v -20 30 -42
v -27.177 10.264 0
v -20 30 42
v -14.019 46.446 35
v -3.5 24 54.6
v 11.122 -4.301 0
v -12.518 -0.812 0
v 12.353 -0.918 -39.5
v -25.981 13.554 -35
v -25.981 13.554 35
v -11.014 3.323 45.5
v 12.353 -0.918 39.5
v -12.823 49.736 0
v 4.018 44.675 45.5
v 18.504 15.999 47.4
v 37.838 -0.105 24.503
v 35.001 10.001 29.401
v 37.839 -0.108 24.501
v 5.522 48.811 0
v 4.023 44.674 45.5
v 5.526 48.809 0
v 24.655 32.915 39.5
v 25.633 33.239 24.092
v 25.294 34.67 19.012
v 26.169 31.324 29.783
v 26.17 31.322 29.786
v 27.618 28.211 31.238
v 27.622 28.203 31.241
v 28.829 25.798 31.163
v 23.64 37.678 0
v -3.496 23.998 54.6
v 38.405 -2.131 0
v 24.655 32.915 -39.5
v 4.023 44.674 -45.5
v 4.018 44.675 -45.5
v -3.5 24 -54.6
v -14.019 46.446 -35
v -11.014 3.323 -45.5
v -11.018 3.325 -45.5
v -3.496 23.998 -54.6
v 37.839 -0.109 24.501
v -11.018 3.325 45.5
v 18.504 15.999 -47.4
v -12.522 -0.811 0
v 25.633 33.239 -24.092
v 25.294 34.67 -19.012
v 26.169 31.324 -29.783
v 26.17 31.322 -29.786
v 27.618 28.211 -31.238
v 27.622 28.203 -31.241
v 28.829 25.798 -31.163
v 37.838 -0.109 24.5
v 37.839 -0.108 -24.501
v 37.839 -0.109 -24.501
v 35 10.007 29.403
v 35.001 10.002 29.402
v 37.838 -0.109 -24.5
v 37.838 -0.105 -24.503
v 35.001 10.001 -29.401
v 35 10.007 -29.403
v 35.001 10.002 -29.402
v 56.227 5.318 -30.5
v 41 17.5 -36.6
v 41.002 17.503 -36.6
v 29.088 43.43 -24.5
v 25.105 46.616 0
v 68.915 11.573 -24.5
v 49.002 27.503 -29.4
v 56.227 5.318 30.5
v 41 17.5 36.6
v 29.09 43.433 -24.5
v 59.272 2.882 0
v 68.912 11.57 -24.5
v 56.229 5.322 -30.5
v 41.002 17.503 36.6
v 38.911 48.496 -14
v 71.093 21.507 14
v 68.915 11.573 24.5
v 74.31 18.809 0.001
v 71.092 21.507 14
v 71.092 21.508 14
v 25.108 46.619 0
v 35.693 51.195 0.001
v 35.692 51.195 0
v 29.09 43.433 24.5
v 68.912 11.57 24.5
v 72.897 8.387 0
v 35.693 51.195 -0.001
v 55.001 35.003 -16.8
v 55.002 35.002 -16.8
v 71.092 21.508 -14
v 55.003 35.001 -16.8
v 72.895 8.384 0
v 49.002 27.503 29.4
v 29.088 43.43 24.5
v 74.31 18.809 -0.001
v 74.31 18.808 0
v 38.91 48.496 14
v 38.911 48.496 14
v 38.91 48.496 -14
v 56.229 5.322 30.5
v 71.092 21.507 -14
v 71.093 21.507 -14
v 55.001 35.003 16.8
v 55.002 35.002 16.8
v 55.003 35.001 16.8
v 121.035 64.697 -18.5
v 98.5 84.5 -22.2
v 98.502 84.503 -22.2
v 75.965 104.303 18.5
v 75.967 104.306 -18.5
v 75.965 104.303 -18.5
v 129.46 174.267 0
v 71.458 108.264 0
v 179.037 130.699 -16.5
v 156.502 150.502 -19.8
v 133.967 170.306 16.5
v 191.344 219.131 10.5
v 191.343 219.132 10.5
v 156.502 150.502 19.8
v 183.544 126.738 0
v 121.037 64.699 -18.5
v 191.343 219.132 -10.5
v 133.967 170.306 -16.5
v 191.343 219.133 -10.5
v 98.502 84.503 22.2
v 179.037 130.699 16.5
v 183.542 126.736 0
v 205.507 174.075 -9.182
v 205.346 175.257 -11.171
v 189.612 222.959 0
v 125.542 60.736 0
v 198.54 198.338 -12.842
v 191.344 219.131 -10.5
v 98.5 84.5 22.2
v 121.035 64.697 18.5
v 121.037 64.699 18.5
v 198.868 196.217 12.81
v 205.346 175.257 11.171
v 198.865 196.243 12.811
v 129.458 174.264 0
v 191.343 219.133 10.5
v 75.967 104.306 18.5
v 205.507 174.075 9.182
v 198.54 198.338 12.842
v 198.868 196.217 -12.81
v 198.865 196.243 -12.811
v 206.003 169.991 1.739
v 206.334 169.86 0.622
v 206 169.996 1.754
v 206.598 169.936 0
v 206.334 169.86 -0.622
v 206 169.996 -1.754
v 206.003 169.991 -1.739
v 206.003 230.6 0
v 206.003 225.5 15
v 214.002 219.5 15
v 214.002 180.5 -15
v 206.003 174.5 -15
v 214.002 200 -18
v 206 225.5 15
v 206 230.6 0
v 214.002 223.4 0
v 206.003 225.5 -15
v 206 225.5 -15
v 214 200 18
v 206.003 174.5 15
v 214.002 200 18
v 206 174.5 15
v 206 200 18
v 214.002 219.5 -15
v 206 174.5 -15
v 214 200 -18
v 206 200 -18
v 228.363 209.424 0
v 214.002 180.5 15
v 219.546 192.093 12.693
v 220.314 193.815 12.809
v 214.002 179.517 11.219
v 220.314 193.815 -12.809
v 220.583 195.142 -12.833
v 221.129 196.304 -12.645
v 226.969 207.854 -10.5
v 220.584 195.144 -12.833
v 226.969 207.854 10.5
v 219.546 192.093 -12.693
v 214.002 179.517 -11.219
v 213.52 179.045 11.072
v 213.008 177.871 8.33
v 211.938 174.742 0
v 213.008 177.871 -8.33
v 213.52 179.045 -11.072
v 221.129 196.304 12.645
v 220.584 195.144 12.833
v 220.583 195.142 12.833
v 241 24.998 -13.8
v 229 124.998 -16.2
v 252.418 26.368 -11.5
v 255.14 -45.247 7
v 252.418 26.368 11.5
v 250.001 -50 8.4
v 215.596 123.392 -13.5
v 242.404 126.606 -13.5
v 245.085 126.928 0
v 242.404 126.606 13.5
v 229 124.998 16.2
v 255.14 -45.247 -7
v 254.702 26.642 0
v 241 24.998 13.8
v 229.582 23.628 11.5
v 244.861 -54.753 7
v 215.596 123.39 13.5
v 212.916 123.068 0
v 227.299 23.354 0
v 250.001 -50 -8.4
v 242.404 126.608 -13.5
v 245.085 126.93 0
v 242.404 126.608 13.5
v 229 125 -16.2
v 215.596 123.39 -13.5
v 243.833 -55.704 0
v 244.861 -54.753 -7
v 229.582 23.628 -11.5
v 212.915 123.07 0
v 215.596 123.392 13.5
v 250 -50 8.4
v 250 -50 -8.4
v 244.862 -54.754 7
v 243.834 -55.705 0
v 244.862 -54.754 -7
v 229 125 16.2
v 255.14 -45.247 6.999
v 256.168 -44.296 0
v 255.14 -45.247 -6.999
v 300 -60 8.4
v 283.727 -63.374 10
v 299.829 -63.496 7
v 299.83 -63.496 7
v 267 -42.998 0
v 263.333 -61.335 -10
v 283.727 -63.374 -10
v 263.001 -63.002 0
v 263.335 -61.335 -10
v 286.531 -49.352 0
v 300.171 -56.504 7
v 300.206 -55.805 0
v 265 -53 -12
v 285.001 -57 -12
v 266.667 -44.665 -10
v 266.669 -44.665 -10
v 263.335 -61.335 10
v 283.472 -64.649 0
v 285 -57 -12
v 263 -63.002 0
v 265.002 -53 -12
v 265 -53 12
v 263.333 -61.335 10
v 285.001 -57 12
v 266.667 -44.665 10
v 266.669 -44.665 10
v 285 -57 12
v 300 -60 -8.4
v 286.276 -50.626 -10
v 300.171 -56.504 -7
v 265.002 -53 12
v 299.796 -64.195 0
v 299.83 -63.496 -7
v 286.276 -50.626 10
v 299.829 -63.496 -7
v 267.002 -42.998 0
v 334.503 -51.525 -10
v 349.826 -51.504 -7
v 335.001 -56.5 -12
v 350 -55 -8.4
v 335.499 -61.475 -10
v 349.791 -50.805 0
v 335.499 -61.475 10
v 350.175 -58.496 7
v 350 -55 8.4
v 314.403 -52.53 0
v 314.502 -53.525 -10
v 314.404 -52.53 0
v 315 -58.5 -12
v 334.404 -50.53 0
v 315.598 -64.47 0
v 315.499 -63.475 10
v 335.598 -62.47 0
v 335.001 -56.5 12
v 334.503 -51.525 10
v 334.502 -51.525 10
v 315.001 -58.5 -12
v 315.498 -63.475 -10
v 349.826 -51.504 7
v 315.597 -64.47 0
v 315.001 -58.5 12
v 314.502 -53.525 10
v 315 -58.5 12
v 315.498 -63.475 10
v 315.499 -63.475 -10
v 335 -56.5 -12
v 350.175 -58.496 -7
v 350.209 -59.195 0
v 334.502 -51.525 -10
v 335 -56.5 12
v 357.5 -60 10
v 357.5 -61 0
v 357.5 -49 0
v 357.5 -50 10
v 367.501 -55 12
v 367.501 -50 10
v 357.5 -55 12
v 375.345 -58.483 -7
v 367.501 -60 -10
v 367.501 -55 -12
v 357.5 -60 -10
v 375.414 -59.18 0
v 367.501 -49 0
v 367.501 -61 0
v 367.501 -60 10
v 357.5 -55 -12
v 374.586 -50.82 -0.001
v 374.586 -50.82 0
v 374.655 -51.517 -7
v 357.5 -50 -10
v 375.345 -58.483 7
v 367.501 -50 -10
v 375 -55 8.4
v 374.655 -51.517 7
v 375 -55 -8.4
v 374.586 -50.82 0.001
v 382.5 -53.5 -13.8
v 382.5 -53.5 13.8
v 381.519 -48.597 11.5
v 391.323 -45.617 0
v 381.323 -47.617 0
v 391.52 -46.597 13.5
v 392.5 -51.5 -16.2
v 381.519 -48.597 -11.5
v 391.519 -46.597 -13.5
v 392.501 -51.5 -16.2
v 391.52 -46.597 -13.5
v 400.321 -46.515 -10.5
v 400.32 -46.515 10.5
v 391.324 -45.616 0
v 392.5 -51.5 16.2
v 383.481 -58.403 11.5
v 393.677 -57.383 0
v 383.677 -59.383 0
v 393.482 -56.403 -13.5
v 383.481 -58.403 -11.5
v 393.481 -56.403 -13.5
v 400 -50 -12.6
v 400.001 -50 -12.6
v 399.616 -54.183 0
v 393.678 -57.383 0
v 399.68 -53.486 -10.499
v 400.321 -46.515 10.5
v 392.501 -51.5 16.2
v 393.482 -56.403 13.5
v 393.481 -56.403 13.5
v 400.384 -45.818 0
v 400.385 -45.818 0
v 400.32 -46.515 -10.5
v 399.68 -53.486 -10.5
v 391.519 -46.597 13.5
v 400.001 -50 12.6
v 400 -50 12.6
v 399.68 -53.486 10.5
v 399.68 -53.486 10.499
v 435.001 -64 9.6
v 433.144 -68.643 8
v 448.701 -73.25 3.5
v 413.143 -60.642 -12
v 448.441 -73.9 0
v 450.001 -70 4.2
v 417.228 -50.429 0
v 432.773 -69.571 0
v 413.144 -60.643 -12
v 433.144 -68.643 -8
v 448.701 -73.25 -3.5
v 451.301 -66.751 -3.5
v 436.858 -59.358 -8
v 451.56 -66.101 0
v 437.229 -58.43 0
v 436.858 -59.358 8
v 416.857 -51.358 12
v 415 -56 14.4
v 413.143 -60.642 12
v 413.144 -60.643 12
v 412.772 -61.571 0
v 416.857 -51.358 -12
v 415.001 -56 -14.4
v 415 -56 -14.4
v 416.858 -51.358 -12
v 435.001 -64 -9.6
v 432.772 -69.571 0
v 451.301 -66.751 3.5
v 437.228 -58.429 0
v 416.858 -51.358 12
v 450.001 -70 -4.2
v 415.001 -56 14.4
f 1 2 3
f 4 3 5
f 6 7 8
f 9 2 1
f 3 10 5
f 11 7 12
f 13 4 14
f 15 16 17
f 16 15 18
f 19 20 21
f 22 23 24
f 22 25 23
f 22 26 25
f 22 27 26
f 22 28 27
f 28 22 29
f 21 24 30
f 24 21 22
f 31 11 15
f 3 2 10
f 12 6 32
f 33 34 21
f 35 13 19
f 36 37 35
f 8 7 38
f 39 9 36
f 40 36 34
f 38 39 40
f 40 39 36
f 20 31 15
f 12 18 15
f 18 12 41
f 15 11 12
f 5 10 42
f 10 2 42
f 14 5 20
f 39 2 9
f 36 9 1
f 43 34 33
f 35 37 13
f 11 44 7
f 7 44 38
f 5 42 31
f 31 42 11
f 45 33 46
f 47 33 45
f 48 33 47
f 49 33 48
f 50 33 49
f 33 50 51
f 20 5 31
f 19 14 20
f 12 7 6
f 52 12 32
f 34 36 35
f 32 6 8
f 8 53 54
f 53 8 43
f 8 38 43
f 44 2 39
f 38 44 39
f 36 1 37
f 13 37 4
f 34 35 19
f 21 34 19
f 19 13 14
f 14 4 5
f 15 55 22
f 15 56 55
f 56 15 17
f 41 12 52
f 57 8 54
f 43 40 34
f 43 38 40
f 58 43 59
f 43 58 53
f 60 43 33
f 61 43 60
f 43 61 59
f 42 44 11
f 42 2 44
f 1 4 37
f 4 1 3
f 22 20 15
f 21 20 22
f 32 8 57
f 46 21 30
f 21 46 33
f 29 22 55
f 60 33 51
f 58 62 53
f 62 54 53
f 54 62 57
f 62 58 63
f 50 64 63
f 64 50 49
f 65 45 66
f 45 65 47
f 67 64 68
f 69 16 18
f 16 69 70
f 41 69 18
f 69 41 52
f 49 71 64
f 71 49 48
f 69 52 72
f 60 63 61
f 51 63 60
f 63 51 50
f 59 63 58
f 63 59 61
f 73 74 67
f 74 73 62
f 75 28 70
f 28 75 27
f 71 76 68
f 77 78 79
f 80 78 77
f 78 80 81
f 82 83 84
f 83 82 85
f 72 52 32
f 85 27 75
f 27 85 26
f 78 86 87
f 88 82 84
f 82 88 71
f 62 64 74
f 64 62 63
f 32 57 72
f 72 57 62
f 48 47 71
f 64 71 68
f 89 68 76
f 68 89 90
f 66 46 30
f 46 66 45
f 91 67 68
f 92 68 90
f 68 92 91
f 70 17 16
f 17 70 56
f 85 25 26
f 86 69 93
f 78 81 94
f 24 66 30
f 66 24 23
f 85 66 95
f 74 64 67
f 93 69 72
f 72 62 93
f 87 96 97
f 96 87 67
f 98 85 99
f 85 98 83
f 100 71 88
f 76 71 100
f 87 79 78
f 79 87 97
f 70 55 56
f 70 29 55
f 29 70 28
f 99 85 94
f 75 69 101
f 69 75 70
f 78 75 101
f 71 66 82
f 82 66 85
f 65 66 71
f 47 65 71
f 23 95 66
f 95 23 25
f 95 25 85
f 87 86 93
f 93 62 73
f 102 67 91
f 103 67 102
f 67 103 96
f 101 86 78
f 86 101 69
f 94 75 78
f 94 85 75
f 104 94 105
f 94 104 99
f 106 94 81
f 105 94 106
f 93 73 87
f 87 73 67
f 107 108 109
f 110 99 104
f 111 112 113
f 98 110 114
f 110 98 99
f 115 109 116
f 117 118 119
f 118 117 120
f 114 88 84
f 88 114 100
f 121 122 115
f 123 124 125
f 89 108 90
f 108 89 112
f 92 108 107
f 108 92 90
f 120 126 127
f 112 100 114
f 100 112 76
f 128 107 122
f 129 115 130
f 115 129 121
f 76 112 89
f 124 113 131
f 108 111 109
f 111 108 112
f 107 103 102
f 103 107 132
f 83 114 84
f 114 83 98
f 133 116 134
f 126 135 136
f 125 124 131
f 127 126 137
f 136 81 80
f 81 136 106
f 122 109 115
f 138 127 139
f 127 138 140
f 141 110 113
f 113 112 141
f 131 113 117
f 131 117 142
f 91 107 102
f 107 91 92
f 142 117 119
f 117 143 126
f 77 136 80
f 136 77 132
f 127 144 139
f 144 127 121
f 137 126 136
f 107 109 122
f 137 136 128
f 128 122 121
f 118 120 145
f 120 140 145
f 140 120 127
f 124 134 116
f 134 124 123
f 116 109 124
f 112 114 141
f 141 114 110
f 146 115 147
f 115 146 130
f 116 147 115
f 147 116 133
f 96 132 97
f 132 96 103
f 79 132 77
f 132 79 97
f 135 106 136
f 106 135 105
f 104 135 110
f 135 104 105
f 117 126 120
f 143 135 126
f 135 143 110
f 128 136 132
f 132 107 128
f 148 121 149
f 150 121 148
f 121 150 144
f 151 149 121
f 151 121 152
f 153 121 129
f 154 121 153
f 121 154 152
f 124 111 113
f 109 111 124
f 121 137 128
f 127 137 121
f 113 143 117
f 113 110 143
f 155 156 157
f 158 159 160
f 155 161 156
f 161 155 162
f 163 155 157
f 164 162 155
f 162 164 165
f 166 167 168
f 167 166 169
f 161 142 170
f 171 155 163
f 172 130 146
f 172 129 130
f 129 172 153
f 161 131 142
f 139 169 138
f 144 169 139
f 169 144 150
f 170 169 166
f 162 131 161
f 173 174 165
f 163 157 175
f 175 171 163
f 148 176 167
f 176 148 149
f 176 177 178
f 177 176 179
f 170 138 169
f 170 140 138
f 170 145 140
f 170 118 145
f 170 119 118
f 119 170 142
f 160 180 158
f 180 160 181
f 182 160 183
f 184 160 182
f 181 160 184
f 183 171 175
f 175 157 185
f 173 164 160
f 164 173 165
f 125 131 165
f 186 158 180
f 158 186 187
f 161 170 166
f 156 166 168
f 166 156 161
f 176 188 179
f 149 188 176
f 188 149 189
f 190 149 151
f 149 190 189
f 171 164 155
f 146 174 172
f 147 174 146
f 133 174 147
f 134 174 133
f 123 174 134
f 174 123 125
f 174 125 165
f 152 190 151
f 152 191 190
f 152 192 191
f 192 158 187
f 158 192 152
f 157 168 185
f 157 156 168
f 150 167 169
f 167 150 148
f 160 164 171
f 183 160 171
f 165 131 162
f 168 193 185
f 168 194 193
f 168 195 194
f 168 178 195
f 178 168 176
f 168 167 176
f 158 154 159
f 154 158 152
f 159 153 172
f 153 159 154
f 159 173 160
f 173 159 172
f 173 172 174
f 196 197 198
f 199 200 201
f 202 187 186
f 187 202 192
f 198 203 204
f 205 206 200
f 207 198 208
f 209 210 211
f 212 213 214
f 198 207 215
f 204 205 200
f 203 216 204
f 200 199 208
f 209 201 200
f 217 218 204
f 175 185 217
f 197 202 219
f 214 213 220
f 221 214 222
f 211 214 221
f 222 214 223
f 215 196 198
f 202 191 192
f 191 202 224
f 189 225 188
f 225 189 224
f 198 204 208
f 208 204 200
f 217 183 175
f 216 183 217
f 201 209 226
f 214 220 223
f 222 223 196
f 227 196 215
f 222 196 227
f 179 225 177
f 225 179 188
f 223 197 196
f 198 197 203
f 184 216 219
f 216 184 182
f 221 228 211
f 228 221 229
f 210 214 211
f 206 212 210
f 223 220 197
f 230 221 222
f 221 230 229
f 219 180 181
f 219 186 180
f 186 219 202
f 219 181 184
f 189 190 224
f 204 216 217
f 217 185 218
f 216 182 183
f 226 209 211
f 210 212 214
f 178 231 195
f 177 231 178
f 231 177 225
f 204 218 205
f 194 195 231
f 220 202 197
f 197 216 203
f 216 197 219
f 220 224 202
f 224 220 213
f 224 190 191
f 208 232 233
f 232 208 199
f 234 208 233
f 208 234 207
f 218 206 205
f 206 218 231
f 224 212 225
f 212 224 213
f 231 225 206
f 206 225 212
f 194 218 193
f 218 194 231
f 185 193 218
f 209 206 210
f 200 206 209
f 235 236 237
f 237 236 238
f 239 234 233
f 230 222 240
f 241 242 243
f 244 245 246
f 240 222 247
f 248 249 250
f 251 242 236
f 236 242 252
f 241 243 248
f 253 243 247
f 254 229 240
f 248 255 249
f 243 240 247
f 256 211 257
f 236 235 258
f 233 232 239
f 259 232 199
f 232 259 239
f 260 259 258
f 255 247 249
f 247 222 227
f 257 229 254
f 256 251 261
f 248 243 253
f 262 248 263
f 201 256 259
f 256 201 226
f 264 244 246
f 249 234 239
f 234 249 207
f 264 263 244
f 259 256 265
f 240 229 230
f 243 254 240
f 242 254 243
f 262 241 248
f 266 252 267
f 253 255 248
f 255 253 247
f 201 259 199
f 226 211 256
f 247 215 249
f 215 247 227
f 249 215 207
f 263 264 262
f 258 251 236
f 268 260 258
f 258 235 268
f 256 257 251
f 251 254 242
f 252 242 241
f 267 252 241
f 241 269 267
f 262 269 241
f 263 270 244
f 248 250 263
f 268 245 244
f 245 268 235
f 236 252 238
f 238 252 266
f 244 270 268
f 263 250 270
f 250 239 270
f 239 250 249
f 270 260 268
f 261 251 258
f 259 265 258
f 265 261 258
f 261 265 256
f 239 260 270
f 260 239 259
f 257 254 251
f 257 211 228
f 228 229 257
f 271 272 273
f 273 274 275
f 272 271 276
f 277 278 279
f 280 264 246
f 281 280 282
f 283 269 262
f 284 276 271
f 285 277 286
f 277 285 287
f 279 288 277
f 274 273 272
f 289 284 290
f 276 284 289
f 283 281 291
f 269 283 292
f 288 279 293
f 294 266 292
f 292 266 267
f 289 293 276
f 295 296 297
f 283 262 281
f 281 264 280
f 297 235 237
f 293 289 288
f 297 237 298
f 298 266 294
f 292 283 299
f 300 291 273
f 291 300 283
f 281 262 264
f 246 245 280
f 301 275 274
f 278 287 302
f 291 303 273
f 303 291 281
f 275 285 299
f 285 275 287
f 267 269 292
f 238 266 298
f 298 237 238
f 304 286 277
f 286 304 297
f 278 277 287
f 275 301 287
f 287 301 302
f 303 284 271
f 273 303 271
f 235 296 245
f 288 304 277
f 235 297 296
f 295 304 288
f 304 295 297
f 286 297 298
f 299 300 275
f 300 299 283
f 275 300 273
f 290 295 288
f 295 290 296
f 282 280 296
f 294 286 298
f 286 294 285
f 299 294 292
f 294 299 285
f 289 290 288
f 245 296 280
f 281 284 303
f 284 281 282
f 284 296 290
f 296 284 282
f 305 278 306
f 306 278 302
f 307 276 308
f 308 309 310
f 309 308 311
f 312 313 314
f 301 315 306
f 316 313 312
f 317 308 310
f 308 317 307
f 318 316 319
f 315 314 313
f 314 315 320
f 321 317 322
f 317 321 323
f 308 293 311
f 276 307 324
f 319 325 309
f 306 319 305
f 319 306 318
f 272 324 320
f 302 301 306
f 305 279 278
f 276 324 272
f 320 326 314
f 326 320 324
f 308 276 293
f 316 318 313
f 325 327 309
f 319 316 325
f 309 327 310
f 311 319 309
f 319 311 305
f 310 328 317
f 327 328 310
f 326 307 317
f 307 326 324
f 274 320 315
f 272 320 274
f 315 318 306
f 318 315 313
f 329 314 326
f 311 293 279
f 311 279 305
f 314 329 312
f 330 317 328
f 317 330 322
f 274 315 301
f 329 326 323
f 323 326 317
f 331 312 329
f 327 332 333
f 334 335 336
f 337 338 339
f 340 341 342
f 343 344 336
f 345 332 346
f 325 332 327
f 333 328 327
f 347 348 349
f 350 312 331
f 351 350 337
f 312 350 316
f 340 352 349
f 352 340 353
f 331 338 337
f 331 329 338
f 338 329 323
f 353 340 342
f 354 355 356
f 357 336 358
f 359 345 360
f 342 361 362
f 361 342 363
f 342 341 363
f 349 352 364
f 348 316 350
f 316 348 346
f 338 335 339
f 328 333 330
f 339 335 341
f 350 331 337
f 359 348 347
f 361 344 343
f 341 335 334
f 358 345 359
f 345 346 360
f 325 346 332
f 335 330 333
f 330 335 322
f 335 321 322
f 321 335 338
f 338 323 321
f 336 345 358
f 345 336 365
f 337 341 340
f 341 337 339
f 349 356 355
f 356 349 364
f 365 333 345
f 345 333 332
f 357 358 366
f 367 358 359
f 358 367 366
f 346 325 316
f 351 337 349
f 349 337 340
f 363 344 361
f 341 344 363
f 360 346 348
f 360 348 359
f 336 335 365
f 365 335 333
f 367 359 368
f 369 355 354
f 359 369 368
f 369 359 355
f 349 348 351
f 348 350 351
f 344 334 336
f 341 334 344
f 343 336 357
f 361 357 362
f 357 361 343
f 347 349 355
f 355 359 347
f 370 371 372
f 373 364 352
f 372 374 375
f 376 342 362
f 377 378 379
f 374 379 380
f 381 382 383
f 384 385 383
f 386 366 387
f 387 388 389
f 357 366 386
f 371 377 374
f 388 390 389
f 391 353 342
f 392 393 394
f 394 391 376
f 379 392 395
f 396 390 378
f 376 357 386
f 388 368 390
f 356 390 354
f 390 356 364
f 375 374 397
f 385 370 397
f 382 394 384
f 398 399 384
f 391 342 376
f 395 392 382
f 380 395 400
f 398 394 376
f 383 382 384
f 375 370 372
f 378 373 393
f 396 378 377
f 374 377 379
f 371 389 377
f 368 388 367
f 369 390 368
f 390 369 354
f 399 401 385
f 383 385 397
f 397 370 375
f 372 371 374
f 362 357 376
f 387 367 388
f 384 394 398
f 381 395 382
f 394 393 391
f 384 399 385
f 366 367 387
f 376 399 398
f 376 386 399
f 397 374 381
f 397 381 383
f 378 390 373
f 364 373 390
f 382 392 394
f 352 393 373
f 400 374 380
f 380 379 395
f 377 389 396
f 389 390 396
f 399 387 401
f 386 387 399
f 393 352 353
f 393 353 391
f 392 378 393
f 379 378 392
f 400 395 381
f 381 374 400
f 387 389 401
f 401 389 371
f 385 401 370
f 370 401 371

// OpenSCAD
Leg = [
  [-20, 30, 0,[10,5,5]],
  [35, 10,0,[7,3,4]],// Coxa
  [55,  35,0,[4,6,4]],//Trochanter
  [200, 200,0, [3,6,3]],//Femur  
  [220, 200,0,[3,3,2] ],//Patella
  [250,-50,0,[2,2,2]],//Tibia
  [300,-60, 0, [2,1,1]],//Tarsus
  [350,  -55,0,[2,1,1]],// Tarsomeres
  [375,  -55,0,[2,1,1]],// Tarsomeres
  [400,  -50,0,[3,1,1]],// Tarsomeres
 [450,  -70,0,[1,1,1]], //claw
];


profile = [
  [5, 5],
  [0,6],
[-5, 5],
[-6,0],
[-5, -5],
[0,-6],
[5, -5],
[6,0]
];


bodypart ( profile, Leg );
    

module bodypart(profile, List, grove=0.7,lrp1=0.3,lrp2=0.7) {
    lrp0=0;
    lrp3=1;
   sth = 0.001;
  for(i = [0: len(List) - 2]) {
    hull() {
      if(i == 0) {
          
color("red")
ttranslate(List[i]) rotate(getangle(v(i,List)))  scale(lerp(List[i][3],List[i+1][3],lrp0)) scale(grove)  linear_extrude(height = sth) polygon(profile);
ttranslate(lerp(List[i ],List[i + 1],lrp1)) rotate(getangle(v(i,List) ) )    scale(lerp(List[i][3],List[i+1][3],lrp1)) linear_extrude(height = sth) polygon(profile);
ttranslate(lerp(List[i ],List[i + 1],lrp2)) rotate(getangle(v(i,List) ) )    scale(lerp(List[i][3],List[i+1][3],lrp2)) linear_extrude(height = sth) polygon(profile);

color("green")
ttranslate(List[i + 1]) rotate((getangle(v(i,List)) + getangle(v(i+1,List))) / 2) scale(lerp(List[i][3],List[i+1][3],lrp3))  scale(grove)  linear_extrude(height = sth) polygon(profile);
      
} else if(i == len(List) - 2) {

color("red")
ttranslate(List[i ])  rotate((getangle(v(i-1,List)) + getangle(v(i,List))) / 2)   scale(lerp(List[i][3],List[i+1][3],lrp0)) scale(grove)  linear_extrude(height = sth) polygon(profile);


ttranslate(lerp(List[i ],List[i + 1],lrp1)) rotate(getangle(v(i,List) ) )    scale(lerp(List[i][3],List[i+1][3],lrp1)) linear_extrude(height = sth) polygon(profile);
ttranslate(lerp(List[i ],List[i + 1],lrp2)) rotate(getangle(v(i,List) ) )    scale(lerp(List[i][3],List[i+1][3],lrp2)) linear_extrude(height = sth) polygon(profile);

color("green")
ttranslate(List[i+1]) rotate(getangle(v(i,List))) scale(lerp(List[i][3],List[i+1][3],lrp3))  scale(grove)  linear_extrude(height = sth) polygon(profile);

      } 
 else {
echo(getangle(v(i,List)));
color("red")
ttranslate(List[i ])  rotate((getangle(v(i-1,List)) + getangle(v(i,List))) / 2)   scale(lerp(List[i][3],List[i+1][3],lrp0)) scale(grove)  linear_extrude(height = sth) polygon(profile);


ttranslate(lerp(List[i ],List[i + 1],lrp1)) rotate(getangle(v(i,List) ) )    scale(lerp(List[i][3],List[i+1][3],lrp1)) linear_extrude(height = sth) polygon(profile);
ttranslate(lerp(List[i ],List[i + 1],lrp2)) rotate(getangle(v(i,List) ) )    scale(lerp(List[i][3],List[i+1][3],lrp2))  linear_extrude(height = sth) polygon(profile);

color("green")
ttranslate(List[i + 1]) rotate((getangle(v(i,List)) + getangle(v(i+1,List))) / 2)scale(lerp(List[i][3],List[i+1][3],lrp3))   scale(grove)  linear_extrude(height = sth) polygon(profile);
 
     }
    }
  }
}
module ttranslate(v){
          for (j=[0:$children-1]) 
      translate(t(v))  children(j);
    }
    
function getangle(v) = (len(v) == 3||len(v) == 4) ? [0, 90, 0] + geteuler(lim3(1, v)): [90, 0, 0] + [0, 0, -atan2(v[0], v[1])];
function lerp(start,end,bias ) = (end * bias + start * (1 - bias));
function geteuler(v) = [0, -asin(v[2]), atan2(v2xy(v)[1], v2xy(v)[0])]; //Euler angles from Vec3
function v2xy(v) = lim3(1, [v[0], v[1], 0]); // down projection xyz2xy
function lim3(l, v) = v / len3(v) * l; // normalize Vec37Vec4 to magnitude l
function len3(v) = sqrt(pow(v[0], 2) + pow(v[1], 2) + pow(v[2], 2)); // find magnitude of Vec3
function v(i,v)=v[i+1]-v[i]; // vec3 from polyline segment
function t(v) = [v[0], v[1], v[2]];// purge vec4... down to vec3 (for translate to play nice)
